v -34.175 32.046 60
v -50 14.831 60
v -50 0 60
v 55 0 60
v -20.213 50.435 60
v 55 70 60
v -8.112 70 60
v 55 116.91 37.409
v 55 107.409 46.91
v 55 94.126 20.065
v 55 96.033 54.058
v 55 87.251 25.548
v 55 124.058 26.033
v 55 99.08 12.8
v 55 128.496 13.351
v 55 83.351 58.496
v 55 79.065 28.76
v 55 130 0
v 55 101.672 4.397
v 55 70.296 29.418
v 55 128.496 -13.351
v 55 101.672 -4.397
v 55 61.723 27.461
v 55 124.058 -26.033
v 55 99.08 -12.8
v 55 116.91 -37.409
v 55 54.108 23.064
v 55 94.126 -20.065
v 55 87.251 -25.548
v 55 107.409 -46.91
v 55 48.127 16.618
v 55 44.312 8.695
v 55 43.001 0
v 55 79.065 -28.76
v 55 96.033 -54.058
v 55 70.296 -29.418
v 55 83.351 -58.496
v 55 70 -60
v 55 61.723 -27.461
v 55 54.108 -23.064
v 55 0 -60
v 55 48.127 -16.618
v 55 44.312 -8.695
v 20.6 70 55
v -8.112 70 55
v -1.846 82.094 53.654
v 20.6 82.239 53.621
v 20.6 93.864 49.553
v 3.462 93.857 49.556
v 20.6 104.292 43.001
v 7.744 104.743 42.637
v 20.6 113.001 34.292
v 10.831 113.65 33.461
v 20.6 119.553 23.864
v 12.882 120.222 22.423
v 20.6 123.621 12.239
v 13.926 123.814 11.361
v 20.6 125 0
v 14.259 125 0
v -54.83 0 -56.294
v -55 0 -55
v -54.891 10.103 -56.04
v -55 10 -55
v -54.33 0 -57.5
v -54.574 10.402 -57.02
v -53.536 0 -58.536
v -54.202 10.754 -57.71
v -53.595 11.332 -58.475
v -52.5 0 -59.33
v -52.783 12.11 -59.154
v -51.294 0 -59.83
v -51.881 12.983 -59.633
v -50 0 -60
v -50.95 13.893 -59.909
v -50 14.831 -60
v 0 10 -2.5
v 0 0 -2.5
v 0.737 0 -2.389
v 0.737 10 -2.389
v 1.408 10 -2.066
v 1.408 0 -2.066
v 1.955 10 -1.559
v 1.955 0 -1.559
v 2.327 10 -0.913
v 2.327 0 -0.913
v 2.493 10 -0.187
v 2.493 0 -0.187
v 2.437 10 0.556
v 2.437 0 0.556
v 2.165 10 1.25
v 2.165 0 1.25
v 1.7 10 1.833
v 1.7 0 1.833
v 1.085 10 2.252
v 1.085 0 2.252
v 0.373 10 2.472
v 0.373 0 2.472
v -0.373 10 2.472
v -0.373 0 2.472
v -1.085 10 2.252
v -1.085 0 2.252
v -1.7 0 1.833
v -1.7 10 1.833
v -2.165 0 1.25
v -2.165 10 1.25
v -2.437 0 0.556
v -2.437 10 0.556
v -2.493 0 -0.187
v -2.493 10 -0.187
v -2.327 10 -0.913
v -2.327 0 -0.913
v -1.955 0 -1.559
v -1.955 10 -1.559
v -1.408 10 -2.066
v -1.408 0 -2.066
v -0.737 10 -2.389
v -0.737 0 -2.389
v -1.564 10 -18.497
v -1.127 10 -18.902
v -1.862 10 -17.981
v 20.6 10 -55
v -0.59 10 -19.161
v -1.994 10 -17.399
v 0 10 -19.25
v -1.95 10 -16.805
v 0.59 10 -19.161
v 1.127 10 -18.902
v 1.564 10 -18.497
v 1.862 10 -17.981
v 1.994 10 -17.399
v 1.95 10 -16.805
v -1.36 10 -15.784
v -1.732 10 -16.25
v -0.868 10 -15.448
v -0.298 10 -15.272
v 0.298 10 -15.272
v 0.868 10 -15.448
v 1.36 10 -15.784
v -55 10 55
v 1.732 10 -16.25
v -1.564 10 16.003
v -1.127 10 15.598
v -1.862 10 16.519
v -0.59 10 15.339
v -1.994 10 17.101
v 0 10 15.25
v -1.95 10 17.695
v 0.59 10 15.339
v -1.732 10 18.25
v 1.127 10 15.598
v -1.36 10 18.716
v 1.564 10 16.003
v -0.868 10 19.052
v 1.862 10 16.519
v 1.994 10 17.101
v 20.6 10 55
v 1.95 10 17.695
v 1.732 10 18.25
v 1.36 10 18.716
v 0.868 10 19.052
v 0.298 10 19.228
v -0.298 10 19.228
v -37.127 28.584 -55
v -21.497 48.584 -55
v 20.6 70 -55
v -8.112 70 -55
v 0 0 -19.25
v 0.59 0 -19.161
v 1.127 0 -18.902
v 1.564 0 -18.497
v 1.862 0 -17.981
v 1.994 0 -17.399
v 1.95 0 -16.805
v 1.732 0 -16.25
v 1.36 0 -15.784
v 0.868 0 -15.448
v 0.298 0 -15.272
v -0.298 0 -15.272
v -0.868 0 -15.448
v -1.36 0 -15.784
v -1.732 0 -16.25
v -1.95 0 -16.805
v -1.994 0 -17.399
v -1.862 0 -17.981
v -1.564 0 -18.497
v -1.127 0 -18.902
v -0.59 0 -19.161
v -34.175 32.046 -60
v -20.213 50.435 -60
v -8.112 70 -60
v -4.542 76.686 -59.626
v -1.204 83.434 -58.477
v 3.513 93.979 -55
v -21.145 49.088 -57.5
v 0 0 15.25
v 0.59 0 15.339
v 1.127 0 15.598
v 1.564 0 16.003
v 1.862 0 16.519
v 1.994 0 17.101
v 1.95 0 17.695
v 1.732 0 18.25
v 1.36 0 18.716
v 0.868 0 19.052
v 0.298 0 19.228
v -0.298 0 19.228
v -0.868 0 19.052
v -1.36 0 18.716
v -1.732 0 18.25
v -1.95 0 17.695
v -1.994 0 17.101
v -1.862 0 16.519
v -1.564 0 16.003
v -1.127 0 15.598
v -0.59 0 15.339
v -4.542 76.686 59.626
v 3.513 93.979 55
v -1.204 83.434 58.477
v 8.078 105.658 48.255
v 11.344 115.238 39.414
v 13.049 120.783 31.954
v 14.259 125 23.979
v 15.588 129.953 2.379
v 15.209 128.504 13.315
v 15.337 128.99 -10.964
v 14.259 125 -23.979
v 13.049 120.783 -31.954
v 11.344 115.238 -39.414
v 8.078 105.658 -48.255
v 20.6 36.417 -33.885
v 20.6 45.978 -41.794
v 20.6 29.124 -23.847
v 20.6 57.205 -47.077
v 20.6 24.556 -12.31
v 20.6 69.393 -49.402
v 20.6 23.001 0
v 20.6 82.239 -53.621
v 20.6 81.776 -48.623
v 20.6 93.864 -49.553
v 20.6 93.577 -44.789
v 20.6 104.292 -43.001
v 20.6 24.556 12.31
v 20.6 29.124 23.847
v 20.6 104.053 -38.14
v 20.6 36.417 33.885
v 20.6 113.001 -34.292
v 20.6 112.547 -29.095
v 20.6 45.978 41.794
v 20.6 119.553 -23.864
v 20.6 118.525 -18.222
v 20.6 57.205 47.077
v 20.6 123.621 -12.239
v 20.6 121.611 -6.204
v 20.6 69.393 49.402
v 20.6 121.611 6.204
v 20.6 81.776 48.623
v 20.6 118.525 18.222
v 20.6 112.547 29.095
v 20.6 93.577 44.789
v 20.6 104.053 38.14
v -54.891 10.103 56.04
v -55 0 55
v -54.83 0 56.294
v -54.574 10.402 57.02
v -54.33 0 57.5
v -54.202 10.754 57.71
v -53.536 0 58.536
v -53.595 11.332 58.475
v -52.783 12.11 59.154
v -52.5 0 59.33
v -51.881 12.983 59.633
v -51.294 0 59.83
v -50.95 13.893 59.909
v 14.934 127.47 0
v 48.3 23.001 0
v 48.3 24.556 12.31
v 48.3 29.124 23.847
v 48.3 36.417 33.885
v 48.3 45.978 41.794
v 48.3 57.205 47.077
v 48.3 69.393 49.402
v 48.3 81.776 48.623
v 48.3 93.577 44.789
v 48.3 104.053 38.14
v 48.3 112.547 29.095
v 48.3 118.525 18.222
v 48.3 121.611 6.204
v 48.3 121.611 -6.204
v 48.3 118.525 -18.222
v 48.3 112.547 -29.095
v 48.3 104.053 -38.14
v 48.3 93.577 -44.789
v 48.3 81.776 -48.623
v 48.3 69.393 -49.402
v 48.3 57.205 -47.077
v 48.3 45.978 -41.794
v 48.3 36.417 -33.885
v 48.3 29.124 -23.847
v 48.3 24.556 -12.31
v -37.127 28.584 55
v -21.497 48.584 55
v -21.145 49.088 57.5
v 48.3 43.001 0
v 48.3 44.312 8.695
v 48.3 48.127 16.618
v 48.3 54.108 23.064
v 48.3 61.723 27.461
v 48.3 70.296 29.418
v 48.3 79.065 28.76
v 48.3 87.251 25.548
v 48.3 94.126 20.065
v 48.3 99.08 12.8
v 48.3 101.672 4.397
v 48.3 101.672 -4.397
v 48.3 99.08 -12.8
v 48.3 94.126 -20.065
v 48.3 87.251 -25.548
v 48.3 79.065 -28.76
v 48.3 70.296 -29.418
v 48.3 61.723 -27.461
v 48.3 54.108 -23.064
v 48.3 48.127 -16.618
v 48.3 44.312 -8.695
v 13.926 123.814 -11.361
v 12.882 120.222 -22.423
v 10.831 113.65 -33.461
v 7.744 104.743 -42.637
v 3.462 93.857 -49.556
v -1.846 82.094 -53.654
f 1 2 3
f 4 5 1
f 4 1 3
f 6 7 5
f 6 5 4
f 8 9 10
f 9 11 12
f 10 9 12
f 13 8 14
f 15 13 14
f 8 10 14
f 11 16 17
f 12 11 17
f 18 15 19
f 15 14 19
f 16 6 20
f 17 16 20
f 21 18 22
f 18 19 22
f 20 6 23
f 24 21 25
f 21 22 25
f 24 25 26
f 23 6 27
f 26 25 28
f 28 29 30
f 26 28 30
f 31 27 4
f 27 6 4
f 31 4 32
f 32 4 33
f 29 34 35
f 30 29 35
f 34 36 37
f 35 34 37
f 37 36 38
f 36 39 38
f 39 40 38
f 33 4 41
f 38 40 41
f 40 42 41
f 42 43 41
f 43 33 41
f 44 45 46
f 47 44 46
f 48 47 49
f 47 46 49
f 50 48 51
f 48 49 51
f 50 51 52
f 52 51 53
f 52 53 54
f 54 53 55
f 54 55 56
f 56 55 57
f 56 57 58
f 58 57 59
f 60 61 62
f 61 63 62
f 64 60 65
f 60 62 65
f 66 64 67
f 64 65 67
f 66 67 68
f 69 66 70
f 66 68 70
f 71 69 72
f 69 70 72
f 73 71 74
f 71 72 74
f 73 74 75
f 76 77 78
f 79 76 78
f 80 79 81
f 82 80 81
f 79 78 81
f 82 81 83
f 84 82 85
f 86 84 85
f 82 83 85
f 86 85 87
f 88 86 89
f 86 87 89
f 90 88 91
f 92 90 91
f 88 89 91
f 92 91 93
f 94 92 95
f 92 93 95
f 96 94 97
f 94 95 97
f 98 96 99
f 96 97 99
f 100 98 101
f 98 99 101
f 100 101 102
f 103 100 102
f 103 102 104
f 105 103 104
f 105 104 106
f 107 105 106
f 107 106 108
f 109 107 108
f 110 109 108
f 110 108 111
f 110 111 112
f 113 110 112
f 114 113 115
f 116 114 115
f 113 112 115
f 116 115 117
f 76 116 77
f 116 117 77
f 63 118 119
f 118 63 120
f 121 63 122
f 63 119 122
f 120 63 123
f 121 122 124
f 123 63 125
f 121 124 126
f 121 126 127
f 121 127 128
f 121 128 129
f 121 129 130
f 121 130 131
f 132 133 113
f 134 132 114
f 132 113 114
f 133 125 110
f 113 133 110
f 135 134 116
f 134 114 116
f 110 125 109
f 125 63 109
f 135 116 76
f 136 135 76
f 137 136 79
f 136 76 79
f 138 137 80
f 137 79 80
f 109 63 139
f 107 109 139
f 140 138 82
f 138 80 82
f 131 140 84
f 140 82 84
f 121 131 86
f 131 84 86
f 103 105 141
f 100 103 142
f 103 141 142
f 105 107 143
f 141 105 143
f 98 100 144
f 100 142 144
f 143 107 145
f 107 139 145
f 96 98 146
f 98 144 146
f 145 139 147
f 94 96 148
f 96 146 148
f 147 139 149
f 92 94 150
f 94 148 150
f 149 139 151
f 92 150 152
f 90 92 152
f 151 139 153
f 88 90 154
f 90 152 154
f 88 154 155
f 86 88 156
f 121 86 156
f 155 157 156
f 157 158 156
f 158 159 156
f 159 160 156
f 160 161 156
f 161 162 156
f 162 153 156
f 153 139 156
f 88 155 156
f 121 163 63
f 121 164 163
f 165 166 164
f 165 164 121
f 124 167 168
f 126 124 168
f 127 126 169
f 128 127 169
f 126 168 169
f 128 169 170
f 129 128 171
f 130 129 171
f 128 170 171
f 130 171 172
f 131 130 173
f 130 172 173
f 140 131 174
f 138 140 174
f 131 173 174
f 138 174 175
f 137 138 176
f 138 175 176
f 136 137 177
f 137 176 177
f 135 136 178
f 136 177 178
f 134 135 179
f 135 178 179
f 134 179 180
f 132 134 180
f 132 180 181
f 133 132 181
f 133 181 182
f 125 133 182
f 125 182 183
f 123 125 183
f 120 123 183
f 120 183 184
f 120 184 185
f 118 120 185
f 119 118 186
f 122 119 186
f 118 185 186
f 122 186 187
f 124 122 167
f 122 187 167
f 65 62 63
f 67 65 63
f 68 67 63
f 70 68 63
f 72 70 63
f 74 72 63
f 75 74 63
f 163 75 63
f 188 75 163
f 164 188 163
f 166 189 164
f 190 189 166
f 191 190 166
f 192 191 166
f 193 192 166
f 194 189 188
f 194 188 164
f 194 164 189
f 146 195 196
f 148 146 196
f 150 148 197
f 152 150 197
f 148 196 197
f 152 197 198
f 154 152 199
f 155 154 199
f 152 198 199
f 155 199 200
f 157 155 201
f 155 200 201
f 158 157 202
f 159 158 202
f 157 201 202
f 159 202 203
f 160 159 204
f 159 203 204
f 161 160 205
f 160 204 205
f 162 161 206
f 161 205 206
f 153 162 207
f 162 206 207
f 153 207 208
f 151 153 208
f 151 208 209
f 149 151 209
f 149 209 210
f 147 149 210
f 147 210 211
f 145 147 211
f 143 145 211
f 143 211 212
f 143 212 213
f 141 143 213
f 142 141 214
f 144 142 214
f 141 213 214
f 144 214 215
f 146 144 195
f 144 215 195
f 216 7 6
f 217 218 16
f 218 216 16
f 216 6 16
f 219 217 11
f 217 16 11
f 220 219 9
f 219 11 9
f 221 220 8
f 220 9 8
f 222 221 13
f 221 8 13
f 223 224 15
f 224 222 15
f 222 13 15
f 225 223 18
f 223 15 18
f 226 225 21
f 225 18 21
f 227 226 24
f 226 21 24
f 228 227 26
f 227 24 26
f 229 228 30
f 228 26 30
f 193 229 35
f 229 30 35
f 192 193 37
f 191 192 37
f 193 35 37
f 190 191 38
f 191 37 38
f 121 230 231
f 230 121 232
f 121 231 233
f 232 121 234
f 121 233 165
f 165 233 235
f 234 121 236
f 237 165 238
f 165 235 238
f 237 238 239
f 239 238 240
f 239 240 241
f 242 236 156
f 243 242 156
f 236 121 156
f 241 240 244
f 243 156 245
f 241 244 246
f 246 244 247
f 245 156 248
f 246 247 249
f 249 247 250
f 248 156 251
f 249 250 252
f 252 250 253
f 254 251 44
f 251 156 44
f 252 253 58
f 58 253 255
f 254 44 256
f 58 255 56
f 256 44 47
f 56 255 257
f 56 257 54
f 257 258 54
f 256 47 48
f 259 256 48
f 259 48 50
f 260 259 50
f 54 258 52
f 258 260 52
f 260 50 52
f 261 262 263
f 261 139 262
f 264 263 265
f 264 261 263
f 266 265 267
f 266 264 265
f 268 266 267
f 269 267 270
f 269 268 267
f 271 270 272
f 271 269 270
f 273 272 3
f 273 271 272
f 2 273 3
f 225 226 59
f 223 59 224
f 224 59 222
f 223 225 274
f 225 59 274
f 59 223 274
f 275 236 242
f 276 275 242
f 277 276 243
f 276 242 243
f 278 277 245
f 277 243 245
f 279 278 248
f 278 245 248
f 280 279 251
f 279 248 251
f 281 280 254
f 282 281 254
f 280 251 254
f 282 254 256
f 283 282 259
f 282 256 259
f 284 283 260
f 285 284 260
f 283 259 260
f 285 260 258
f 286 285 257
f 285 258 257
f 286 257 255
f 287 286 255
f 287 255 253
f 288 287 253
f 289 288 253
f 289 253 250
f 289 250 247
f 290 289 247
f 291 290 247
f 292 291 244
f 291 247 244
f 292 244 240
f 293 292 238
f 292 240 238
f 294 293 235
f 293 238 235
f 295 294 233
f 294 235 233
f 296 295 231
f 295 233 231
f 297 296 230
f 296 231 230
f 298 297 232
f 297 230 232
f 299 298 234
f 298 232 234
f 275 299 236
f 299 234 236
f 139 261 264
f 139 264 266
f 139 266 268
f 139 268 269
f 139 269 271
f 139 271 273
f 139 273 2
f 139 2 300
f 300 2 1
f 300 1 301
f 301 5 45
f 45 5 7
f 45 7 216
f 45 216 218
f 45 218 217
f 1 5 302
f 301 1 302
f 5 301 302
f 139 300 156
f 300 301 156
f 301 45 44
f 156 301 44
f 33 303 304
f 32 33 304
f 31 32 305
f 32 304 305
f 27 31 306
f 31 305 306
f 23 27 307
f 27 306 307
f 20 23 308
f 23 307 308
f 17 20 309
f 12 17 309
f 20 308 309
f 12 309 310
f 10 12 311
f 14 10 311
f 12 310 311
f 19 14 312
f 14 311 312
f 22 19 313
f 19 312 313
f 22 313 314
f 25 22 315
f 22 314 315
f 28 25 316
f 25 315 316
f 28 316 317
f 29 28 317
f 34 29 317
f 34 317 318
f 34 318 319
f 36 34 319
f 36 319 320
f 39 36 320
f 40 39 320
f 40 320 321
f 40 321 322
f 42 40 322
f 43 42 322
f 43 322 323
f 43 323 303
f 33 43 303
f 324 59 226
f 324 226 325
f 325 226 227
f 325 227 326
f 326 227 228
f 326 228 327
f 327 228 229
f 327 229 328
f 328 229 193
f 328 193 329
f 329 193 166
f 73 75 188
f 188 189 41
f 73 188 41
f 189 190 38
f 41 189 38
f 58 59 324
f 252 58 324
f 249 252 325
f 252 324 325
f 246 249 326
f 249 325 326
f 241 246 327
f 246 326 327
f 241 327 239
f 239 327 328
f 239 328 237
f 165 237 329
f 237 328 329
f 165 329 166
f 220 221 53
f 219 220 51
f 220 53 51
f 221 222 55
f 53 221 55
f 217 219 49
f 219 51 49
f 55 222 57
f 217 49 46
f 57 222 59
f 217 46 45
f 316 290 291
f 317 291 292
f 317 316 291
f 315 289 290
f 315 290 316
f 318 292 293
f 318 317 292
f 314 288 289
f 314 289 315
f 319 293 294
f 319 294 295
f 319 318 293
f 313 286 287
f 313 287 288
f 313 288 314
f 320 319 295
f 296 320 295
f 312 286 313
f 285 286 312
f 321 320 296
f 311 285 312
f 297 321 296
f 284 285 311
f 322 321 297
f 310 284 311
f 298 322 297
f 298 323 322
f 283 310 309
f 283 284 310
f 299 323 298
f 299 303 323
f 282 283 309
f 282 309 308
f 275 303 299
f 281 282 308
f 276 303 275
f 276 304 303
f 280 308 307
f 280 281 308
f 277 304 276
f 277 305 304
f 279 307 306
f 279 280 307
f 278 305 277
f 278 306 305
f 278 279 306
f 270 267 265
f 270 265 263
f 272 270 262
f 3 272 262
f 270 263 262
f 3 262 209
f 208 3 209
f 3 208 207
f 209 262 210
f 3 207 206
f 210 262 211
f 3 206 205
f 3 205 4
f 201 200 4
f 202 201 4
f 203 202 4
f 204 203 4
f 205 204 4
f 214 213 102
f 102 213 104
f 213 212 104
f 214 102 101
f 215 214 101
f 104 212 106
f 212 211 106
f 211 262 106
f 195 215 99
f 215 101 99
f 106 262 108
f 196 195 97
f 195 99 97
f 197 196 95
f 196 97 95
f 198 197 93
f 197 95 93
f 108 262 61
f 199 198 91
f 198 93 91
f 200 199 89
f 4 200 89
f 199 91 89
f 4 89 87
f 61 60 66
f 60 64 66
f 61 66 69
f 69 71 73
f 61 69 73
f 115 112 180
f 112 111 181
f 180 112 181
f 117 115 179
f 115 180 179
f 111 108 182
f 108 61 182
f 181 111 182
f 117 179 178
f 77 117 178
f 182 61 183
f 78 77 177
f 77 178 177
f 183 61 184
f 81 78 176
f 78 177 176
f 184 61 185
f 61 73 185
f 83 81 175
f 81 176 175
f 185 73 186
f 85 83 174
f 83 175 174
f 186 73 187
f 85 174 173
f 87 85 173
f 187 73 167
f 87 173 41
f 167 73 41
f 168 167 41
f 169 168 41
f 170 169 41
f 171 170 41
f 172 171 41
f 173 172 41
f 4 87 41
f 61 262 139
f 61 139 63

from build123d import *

# Parameters (mm, degrees)
SKETCH_1_W          = 110
SKETCH_1_H          = 120
EXTRUDE_1_DEPTH     = 130
SKETCH_3_W          = 75.6
SKETCH_3_H          = 120
CUT_EXTRUDE_1_DEPTH = 130
EXTRUDE_2_DEPTH     = 5
EXTRUDE_3_DEPTH     = 110
FILLET_START        = -8.112141349
FILLET_2_DEPTH      = 28.712141349
FILLET_START_2      = -55
FILLET_2_2_DEPTH    = 110
FILLET_3_R          = 60
FILLET_4_R          = 5
SKETCH_6_R          = 49.5
CUT_EXTRUDE_2_DEPTH = 27.7
SKETCH_7_R          = 29.5
CUT_EXTRUDE_5_DEPTH = 177.552797006
SKETCH_8_R          = 2.5
SKETCH_8_R_2        = 2
CUT_EXTRUDE_6_DEPTH = 10


with BuildPart() as part:
    # 草图1 → 凸台-拉伸1 (new body)
    with BuildSketch(Plane(origin=(0, 0, 0), x_dir=(1, 0, 0), z_dir=(0, 1, 0))):
        Rectangle(SKETCH_1_W, SKETCH_1_H)
    extrude(amount=EXTRUDE_1_DEPTH)

    # 草图3 → 切除-拉伸1 (cut)
    with BuildSketch(Plane.XY.offset(60)):
        with Locations((-17.2, 70)):
            Rectangle(SKETCH_3_W, SKETCH_3_H)
    extrude(amount=-CUT_EXTRUDE_1_DEPTH, mode=Mode.SUBTRACT)

    # 草图4 → 凸台-拉伸2 (add)
    with BuildSketch(Plane.XY.offset(60)):
        with BuildLine():
            Line((20.6, 130), (15.6, 130))
            add(Edge.make_bspline(
                [(-55, 10), (-2.665013162, 59.248795935), (15.6, 130)],
                knots=[0, 0, 0, 1, 1, 1], degree=2))
            Line((-55, 10), (20.6, 10))
            Line((20.6, 10), (20.6, 130))
        make_face()
    extrude_2 = extrude(amount=-EXTRUDE_2_DEPTH)

    # 镜向1: 凸台-拉伸2 across plane
    add(extrude_2.mirror(Plane.XY))

    # 草图5 → 凸台-拉伸3 (add)
    with BuildSketch(Plane(origin=(0, 0, 55), x_dir=(-1, 0, 0), z_dir=(0, 0, -1))):
        with BuildLine():
            Line((-20.6, 130), (-20.6, 125))
            Line((-20.6, 125), (-14.2592003, 125))
            add(Edge.make_bspline(
                [(-14.259200299, 125), (-14.95110103, 127.486430307), (-15.600000021, 130.000000082)],
                knots=[0.964473117, 0.964473117, 0.964473117, 1, 1, 1], degree=2))
            Line((-15.600000021, 130.000000082), (-20.6, 130))
        make_face()
    extrude(amount=EXTRUDE_3_DEPTH)

    # 圆角2: read off the stored shape, not the designer's step
    # 圆角2 outline → 圆角2 (add)
    with BuildSketch(Plane.YZ.offset(FILLET_START)):
        with BuildLine():
            Line((125, 55), (70, 55))
            ThreePointArc((70, 55), (108.890872965, 38.890872965), (125, 0))
            Line((125, 0), (125, 55))
        make_face()
        with BuildLine():
            Line((125, -55), (125, 0))
            ThreePointArc((125, 0), (108.890872965, -38.890872965), (70, -55))
            Line((70, -55), (125, -55))
        make_face()
    extrude(amount=FILLET_2_DEPTH)

    # Fillet 2 2 outline → Fillet 2 2 (cut)
    with BuildSketch(Plane.XY.offset(FILLET_START_2)):
        with BuildLine():
            add(Edge.make_bspline(
                [(14.259200299, 125), (6.078935587, 95.603213424), (-8.112141272, 69.999999958)],
                knots=[0.035526883, 0.035526883, 0.035526883, 0.455557239, 0.455557239, 0.455557239], degree=2))
            Line((14.259200299, 125), (-8.112141349, 125))
            Line((-8.112141349, 125), (-8.112141272, 69.999999958))
        make_face()
    extrude(amount=FILLET_2_2_DEPTH, mode=Mode.SUBTRACT)

    # 圆角3
    # the kernel refuses this fillet: 60 mm, written as the material it takes off along each edge
    with BuildSketch(Plane(origin=(205, 130, 60), x_dir=(0, -1, 0), z_dir=(-1, 0, 0)), Plane(origin=(205, 130, -60), x_dir=(0, 0, 1), z_dir=(-1, 0, 0))) as fillet_3_piece_1:
        with BuildLine():
            CenterArc((FILLET_3_R, -FILLET_3_R), FILLET_3_R, 90, 90)
            Line((0, -FILLET_3_R), (0, 0))
            Line((0, 0), (FILLET_3_R, 0))
        make_face()
    extrude(amount=339.4, mode=Mode.SUBTRACT)

    # 圆角4
    fillet_4_edges = [part.edges().sort_by_distance(p)[0] for p in [
        (-55, 5, 60),
        (-55, 5, -60),
    ]]
    fillet(fillet_4_edges, radius=FILLET_4_R)

    # 草图6 → 切除-拉伸2 (cut)
    with BuildSketch(Plane.ZY.offset(-20.6)):
        with Locations(Location((0, 72.500997163, 0), (0, 0, 270))):
            Circle(SKETCH_6_R)
    extrude(amount=-CUT_EXTRUDE_2_DEPTH, mode=Mode.SUBTRACT)

    # 草图7 → 切除-拉伸5 (cut, through all)
    with BuildSketch(Plane.ZY.offset(-48.3)):
        with Locations(Location((0, 72.500997163, 0), (0, 0, 270))):
            Circle(SKETCH_7_R)
    extrude(amount=-CUT_EXTRUDE_5_DEPTH, mode=Mode.SUBTRACT)

    # 草图8 → 切除-拉伸6 (cut)
    with BuildSketch(Plane.XZ):
        with Locations(Location((0, 0, 0), (0, 0, 270))):
            Circle(SKETCH_8_R)
        with Locations(Location((0, 17.25, 0), (0, 0, 270))):
            Circle(SKETCH_8_R_2)
        with Locations(Location((0, -17.25, 0), (0, 0, 270))):
            Circle(SKETCH_8_R_2)
    extrude(amount=-CUT_EXTRUDE_6_DEPTH, mode=Mode.SUBTRACT)


solid = part.part
